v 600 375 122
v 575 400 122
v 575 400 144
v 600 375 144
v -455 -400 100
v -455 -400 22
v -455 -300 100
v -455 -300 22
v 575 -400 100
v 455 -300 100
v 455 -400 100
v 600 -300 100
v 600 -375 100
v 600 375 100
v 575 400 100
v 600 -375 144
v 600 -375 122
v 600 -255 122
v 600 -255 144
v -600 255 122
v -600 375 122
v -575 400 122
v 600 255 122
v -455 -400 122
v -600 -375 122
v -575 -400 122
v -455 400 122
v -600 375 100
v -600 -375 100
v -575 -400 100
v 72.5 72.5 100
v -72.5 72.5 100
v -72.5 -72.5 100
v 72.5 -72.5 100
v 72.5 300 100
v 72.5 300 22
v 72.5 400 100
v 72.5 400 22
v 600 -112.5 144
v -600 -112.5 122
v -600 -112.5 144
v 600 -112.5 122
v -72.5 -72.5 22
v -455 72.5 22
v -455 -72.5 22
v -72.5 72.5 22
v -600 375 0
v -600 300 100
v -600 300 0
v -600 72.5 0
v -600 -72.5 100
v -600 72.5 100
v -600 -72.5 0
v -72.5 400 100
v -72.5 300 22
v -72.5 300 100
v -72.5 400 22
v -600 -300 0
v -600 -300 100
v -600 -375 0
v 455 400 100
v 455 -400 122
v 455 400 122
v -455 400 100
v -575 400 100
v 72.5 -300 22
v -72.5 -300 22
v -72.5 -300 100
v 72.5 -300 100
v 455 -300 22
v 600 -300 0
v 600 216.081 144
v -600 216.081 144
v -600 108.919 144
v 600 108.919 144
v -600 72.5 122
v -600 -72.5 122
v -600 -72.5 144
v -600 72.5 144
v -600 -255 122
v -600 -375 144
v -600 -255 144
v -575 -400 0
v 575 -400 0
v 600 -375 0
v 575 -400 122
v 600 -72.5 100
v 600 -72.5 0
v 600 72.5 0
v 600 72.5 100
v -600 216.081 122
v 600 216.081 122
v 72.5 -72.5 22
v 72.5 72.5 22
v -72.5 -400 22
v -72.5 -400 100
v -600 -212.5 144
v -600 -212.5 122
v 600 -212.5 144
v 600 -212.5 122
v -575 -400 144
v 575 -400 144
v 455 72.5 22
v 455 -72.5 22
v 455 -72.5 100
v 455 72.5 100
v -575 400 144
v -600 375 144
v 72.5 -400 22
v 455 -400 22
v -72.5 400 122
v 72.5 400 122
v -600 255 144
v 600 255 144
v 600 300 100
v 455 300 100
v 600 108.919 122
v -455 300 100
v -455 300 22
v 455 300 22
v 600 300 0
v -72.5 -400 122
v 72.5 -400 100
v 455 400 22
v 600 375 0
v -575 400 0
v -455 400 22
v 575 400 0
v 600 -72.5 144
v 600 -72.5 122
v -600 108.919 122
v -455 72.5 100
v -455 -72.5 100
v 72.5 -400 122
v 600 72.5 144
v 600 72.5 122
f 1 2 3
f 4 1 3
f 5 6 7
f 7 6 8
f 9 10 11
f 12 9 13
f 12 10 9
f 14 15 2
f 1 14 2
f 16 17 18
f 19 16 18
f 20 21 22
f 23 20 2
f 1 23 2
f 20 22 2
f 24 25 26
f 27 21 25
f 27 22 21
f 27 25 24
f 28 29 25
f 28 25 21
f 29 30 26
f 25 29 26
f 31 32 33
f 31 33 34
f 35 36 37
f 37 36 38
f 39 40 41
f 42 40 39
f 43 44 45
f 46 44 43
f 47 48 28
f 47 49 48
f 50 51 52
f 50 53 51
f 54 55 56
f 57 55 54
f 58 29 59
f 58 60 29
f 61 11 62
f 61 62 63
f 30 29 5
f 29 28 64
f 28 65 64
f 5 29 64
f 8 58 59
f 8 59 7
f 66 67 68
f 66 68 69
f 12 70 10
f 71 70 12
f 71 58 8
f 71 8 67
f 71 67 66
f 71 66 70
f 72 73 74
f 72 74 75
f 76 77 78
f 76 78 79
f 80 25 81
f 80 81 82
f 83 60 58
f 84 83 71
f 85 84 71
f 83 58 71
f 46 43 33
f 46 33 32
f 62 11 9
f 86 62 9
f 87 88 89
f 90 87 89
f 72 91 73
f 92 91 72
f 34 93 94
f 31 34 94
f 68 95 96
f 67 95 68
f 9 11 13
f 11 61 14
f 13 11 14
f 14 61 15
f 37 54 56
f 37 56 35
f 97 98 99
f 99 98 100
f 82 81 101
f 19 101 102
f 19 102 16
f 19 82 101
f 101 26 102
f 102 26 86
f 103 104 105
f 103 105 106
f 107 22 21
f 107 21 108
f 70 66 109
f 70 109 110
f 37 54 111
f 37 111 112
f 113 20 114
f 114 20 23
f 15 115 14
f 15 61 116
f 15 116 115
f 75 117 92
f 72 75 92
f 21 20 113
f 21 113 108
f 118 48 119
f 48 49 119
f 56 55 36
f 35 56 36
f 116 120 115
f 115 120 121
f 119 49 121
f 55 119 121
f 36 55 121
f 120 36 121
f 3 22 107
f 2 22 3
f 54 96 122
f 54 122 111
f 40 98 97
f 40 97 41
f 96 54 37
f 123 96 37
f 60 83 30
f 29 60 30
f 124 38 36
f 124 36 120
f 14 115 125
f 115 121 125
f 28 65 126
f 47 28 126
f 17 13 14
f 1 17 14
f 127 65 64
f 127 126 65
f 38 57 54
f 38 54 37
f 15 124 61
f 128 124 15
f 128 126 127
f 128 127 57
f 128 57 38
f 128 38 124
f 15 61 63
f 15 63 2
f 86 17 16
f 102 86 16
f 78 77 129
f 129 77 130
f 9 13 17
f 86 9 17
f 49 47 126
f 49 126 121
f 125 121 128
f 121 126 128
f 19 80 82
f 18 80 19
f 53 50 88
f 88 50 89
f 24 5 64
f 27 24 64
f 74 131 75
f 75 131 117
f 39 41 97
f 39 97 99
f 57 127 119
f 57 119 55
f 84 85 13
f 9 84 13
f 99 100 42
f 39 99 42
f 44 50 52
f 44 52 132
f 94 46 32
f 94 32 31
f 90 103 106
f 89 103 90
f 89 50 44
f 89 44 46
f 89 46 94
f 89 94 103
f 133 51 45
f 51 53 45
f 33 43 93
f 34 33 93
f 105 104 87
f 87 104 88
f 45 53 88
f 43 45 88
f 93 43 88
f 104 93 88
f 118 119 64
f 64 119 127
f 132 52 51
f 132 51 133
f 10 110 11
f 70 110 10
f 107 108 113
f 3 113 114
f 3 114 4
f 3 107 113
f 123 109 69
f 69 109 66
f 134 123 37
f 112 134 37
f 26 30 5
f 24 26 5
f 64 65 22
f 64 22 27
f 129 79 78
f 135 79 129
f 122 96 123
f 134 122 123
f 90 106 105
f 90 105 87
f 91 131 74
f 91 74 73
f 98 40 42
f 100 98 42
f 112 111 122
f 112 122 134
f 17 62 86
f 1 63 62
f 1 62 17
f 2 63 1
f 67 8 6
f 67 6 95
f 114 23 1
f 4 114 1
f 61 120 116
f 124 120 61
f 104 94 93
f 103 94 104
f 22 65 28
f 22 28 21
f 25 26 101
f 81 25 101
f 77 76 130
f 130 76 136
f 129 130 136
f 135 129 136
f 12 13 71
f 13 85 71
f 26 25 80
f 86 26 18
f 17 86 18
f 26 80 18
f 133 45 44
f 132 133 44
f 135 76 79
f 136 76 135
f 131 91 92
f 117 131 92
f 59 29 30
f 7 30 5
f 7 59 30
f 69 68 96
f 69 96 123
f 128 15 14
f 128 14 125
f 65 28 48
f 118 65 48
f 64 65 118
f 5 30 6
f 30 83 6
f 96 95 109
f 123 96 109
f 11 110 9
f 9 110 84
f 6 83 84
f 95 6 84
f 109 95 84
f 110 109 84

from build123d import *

# Parameters (mm, degrees)
F0_W       = 1200
F0_H       = 100
F0_H_2     = 72.5
F1_DEPTH   = 22
F2_W       = 145
F2_H       = 100
F2_W_2     = 72.5
F3_DEPTH   = 78
F4_W       = 145
F4_H       = 145
F5_DEPTH   = 78
F6_W       = 145
F6_H       = 100
F7_DEPTH   = 78
F8_W       = 145
F8_H       = 800
F9_DEPTH   = 22
F10_W      = 145
F10_H      = 800
F11_DEPTH  = 22
F12_W      = 145
F12_H      = 800
F13_DEPTH  = 22
F14_W      = 1200
F14_H      = 145
F15_DEPTH  = 22
F16_W      = 1200
F16_H      = 145
F17_DEPTH  = 22
F18_W      = 1200
F18_H      = 145
F19_DEPTH  = 22
F20_W      = 1200
F20_H      = 107.16276
F21_DEPTH  = 22
F22_W      = 1200
F22_H      = 100
F23_DEPTH  = 22
F24_SIZE   = 25
F24_2_SIZE = 25
F24_3_SIZE = 25
F24_4_SIZE = 25
F24_5_SIZE = 25


with BuildPart() as f1:
    # F0 (on Top) → F1 (new body)
    with BuildSketch(Plane.XY):
        with Locations((0, 350)):
            Rectangle(F0_W, F0_H)
        with Locations((0, 36.25)):
            Rectangle(F0_W, F0_H_2)
        with Locations((0, -36.25)):
            Rectangle(F0_W, F0_H_2)
        with Locations((0, -350)):
            Rectangle(F0_W, F0_H)
    extrude(amount=F1_DEPTH)

    # F2 (on face) → F3 (join)
    with BuildSketch(Plane.XY.offset(22)):
        with Locations((-527.5, 350)):
            Rectangle(F2_W, F2_H)
        with Locations((-36.25, 350)):
            Rectangle(F2_W_2, F2_H)
        with Locations((36.25, 350)):
            Rectangle(F2_W_2, F2_H)
        with Locations((527.5, 350)):
            Rectangle(F2_W, F2_H)
    extrude(amount=F3_DEPTH)

    # F4 (on face) → F5 (join)
    with BuildSketch(Plane.XY.offset(22)):
        with Locations((-527.5, 0)):
            Rectangle(F4_W, F4_H)
        Rectangle(F4_W, F4_H)
        with Locations((527.5, 0)):
            Rectangle(F4_W, F4_H)
    extrude(amount=F5_DEPTH)

    # F6 (on face) → F7 (join)
    with BuildSketch(Plane.XY.offset(22)):
        with Locations((-527.5, -350)):
            Rectangle(F6_W, F6_H)
        with Locations((0, -350)):
            Rectangle(F6_W, F6_H)
        with Locations((527.5, -350)):
            Rectangle(F6_W, F6_H)
    extrude(amount=F7_DEPTH)

    # F24#3
    f24_3_edges = [f1.edges().sort_by_distance(p)[0] for p in [
        (-600, -400, 50),
        (600, -400, 50),
        (600, 400, 50),
        (-600, 400, 50),
    ]]
    chamfer(f24_3_edges, length=F24_3_SIZE)


with BuildPart() as f9:
    # F8 (on face) → F9 (new body)
    with BuildSketch(Plane.XY.offset(100)):
        with Locations((-527.5, 0)):
            Rectangle(F8_W, F8_H)
    extrude(amount=F9_DEPTH)

    # F24#2
    f24_2_edges = [f9.edges().sort_by_distance(p)[0] for p in [
        (-600, -400, 111),
        (-600, 400, 111),
    ]]
    chamfer(f24_2_edges, length=F24_2_SIZE)


with BuildPart() as f11:
    # F10 (on face) → F11 (new body)
    with BuildSketch(Plane.XY.offset(100)):
        Rectangle(F10_W, F10_H)
    extrude(amount=F11_DEPTH)


with BuildPart() as f13:
    # F12 (on face) → F13 (new body)
    with BuildSketch(Plane.XY.offset(100)):
        with Locations((527.5, 0)):
            Rectangle(F12_W, F12_H)
    extrude(amount=F13_DEPTH)

    # F24#4
    f24_4_edges = [f13.edges().sort_by_distance(p)[0] for p in [
        (600, -400, 111),
        (600, 400, 111),
    ]]
    chamfer(f24_4_edges, length=F24_4_SIZE)


with BuildPart() as f15:
    # F14 (on face) → F15 (new body)
    with BuildSketch(Plane.XY.offset(122)):
        with Locations((0, 327.5)):
            Rectangle(F14_W, F14_H)
    extrude(amount=F15_DEPTH)

    # F24#5
    f24_5_edges = [f15.edges().sort_by_distance(p)[0] for p in [
        (600, 400, 133),
        (-600, 400, 133),
    ]]
    chamfer(f24_5_edges, length=F24_5_SIZE)


with BuildPart() as f17:
    # F16 (on face) → F17 (new body)
    with BuildSketch(Plane.XY.offset(122)):
        Rectangle(F16_W, F16_H)
    extrude(amount=F17_DEPTH)


with BuildPart() as f19:
    # F18 (on face) → F19 (new body)
    with BuildSketch(Plane.XY.offset(122)):
        with Locations((0, -327.5)):
            Rectangle(F18_W, F18_H)
    extrude(amount=F19_DEPTH)

    # F24
    f24_edges = [f19.edges().sort_by_distance(p)[0] for p in [
        (-600, -400, 133),
        (600, -400, 133),
    ]]
    chamfer(f24_edges, length=F24_SIZE)


with BuildPart() as f21:
    # F20 (on face) → F21 (new body)
    with BuildSketch(Plane.XY.offset(122)):
        with Locations((0, 162.5)):
            Rectangle(F20_W, F20_H)
    extrude(amount=F21_DEPTH)


with BuildPart() as f23:
    # F22 (on face) → F23 (new body)
    with BuildSketch(Plane.XY.offset(122)):
        with Locations((0, -162.5)):
            Rectangle(F22_W, F22_H)
    extrude(amount=F23_DEPTH)


solid = Compound([f1.part, f9.part, f11.part, f13.part, f15.part, f17.part, f19.part, f21.part, f23.part])
